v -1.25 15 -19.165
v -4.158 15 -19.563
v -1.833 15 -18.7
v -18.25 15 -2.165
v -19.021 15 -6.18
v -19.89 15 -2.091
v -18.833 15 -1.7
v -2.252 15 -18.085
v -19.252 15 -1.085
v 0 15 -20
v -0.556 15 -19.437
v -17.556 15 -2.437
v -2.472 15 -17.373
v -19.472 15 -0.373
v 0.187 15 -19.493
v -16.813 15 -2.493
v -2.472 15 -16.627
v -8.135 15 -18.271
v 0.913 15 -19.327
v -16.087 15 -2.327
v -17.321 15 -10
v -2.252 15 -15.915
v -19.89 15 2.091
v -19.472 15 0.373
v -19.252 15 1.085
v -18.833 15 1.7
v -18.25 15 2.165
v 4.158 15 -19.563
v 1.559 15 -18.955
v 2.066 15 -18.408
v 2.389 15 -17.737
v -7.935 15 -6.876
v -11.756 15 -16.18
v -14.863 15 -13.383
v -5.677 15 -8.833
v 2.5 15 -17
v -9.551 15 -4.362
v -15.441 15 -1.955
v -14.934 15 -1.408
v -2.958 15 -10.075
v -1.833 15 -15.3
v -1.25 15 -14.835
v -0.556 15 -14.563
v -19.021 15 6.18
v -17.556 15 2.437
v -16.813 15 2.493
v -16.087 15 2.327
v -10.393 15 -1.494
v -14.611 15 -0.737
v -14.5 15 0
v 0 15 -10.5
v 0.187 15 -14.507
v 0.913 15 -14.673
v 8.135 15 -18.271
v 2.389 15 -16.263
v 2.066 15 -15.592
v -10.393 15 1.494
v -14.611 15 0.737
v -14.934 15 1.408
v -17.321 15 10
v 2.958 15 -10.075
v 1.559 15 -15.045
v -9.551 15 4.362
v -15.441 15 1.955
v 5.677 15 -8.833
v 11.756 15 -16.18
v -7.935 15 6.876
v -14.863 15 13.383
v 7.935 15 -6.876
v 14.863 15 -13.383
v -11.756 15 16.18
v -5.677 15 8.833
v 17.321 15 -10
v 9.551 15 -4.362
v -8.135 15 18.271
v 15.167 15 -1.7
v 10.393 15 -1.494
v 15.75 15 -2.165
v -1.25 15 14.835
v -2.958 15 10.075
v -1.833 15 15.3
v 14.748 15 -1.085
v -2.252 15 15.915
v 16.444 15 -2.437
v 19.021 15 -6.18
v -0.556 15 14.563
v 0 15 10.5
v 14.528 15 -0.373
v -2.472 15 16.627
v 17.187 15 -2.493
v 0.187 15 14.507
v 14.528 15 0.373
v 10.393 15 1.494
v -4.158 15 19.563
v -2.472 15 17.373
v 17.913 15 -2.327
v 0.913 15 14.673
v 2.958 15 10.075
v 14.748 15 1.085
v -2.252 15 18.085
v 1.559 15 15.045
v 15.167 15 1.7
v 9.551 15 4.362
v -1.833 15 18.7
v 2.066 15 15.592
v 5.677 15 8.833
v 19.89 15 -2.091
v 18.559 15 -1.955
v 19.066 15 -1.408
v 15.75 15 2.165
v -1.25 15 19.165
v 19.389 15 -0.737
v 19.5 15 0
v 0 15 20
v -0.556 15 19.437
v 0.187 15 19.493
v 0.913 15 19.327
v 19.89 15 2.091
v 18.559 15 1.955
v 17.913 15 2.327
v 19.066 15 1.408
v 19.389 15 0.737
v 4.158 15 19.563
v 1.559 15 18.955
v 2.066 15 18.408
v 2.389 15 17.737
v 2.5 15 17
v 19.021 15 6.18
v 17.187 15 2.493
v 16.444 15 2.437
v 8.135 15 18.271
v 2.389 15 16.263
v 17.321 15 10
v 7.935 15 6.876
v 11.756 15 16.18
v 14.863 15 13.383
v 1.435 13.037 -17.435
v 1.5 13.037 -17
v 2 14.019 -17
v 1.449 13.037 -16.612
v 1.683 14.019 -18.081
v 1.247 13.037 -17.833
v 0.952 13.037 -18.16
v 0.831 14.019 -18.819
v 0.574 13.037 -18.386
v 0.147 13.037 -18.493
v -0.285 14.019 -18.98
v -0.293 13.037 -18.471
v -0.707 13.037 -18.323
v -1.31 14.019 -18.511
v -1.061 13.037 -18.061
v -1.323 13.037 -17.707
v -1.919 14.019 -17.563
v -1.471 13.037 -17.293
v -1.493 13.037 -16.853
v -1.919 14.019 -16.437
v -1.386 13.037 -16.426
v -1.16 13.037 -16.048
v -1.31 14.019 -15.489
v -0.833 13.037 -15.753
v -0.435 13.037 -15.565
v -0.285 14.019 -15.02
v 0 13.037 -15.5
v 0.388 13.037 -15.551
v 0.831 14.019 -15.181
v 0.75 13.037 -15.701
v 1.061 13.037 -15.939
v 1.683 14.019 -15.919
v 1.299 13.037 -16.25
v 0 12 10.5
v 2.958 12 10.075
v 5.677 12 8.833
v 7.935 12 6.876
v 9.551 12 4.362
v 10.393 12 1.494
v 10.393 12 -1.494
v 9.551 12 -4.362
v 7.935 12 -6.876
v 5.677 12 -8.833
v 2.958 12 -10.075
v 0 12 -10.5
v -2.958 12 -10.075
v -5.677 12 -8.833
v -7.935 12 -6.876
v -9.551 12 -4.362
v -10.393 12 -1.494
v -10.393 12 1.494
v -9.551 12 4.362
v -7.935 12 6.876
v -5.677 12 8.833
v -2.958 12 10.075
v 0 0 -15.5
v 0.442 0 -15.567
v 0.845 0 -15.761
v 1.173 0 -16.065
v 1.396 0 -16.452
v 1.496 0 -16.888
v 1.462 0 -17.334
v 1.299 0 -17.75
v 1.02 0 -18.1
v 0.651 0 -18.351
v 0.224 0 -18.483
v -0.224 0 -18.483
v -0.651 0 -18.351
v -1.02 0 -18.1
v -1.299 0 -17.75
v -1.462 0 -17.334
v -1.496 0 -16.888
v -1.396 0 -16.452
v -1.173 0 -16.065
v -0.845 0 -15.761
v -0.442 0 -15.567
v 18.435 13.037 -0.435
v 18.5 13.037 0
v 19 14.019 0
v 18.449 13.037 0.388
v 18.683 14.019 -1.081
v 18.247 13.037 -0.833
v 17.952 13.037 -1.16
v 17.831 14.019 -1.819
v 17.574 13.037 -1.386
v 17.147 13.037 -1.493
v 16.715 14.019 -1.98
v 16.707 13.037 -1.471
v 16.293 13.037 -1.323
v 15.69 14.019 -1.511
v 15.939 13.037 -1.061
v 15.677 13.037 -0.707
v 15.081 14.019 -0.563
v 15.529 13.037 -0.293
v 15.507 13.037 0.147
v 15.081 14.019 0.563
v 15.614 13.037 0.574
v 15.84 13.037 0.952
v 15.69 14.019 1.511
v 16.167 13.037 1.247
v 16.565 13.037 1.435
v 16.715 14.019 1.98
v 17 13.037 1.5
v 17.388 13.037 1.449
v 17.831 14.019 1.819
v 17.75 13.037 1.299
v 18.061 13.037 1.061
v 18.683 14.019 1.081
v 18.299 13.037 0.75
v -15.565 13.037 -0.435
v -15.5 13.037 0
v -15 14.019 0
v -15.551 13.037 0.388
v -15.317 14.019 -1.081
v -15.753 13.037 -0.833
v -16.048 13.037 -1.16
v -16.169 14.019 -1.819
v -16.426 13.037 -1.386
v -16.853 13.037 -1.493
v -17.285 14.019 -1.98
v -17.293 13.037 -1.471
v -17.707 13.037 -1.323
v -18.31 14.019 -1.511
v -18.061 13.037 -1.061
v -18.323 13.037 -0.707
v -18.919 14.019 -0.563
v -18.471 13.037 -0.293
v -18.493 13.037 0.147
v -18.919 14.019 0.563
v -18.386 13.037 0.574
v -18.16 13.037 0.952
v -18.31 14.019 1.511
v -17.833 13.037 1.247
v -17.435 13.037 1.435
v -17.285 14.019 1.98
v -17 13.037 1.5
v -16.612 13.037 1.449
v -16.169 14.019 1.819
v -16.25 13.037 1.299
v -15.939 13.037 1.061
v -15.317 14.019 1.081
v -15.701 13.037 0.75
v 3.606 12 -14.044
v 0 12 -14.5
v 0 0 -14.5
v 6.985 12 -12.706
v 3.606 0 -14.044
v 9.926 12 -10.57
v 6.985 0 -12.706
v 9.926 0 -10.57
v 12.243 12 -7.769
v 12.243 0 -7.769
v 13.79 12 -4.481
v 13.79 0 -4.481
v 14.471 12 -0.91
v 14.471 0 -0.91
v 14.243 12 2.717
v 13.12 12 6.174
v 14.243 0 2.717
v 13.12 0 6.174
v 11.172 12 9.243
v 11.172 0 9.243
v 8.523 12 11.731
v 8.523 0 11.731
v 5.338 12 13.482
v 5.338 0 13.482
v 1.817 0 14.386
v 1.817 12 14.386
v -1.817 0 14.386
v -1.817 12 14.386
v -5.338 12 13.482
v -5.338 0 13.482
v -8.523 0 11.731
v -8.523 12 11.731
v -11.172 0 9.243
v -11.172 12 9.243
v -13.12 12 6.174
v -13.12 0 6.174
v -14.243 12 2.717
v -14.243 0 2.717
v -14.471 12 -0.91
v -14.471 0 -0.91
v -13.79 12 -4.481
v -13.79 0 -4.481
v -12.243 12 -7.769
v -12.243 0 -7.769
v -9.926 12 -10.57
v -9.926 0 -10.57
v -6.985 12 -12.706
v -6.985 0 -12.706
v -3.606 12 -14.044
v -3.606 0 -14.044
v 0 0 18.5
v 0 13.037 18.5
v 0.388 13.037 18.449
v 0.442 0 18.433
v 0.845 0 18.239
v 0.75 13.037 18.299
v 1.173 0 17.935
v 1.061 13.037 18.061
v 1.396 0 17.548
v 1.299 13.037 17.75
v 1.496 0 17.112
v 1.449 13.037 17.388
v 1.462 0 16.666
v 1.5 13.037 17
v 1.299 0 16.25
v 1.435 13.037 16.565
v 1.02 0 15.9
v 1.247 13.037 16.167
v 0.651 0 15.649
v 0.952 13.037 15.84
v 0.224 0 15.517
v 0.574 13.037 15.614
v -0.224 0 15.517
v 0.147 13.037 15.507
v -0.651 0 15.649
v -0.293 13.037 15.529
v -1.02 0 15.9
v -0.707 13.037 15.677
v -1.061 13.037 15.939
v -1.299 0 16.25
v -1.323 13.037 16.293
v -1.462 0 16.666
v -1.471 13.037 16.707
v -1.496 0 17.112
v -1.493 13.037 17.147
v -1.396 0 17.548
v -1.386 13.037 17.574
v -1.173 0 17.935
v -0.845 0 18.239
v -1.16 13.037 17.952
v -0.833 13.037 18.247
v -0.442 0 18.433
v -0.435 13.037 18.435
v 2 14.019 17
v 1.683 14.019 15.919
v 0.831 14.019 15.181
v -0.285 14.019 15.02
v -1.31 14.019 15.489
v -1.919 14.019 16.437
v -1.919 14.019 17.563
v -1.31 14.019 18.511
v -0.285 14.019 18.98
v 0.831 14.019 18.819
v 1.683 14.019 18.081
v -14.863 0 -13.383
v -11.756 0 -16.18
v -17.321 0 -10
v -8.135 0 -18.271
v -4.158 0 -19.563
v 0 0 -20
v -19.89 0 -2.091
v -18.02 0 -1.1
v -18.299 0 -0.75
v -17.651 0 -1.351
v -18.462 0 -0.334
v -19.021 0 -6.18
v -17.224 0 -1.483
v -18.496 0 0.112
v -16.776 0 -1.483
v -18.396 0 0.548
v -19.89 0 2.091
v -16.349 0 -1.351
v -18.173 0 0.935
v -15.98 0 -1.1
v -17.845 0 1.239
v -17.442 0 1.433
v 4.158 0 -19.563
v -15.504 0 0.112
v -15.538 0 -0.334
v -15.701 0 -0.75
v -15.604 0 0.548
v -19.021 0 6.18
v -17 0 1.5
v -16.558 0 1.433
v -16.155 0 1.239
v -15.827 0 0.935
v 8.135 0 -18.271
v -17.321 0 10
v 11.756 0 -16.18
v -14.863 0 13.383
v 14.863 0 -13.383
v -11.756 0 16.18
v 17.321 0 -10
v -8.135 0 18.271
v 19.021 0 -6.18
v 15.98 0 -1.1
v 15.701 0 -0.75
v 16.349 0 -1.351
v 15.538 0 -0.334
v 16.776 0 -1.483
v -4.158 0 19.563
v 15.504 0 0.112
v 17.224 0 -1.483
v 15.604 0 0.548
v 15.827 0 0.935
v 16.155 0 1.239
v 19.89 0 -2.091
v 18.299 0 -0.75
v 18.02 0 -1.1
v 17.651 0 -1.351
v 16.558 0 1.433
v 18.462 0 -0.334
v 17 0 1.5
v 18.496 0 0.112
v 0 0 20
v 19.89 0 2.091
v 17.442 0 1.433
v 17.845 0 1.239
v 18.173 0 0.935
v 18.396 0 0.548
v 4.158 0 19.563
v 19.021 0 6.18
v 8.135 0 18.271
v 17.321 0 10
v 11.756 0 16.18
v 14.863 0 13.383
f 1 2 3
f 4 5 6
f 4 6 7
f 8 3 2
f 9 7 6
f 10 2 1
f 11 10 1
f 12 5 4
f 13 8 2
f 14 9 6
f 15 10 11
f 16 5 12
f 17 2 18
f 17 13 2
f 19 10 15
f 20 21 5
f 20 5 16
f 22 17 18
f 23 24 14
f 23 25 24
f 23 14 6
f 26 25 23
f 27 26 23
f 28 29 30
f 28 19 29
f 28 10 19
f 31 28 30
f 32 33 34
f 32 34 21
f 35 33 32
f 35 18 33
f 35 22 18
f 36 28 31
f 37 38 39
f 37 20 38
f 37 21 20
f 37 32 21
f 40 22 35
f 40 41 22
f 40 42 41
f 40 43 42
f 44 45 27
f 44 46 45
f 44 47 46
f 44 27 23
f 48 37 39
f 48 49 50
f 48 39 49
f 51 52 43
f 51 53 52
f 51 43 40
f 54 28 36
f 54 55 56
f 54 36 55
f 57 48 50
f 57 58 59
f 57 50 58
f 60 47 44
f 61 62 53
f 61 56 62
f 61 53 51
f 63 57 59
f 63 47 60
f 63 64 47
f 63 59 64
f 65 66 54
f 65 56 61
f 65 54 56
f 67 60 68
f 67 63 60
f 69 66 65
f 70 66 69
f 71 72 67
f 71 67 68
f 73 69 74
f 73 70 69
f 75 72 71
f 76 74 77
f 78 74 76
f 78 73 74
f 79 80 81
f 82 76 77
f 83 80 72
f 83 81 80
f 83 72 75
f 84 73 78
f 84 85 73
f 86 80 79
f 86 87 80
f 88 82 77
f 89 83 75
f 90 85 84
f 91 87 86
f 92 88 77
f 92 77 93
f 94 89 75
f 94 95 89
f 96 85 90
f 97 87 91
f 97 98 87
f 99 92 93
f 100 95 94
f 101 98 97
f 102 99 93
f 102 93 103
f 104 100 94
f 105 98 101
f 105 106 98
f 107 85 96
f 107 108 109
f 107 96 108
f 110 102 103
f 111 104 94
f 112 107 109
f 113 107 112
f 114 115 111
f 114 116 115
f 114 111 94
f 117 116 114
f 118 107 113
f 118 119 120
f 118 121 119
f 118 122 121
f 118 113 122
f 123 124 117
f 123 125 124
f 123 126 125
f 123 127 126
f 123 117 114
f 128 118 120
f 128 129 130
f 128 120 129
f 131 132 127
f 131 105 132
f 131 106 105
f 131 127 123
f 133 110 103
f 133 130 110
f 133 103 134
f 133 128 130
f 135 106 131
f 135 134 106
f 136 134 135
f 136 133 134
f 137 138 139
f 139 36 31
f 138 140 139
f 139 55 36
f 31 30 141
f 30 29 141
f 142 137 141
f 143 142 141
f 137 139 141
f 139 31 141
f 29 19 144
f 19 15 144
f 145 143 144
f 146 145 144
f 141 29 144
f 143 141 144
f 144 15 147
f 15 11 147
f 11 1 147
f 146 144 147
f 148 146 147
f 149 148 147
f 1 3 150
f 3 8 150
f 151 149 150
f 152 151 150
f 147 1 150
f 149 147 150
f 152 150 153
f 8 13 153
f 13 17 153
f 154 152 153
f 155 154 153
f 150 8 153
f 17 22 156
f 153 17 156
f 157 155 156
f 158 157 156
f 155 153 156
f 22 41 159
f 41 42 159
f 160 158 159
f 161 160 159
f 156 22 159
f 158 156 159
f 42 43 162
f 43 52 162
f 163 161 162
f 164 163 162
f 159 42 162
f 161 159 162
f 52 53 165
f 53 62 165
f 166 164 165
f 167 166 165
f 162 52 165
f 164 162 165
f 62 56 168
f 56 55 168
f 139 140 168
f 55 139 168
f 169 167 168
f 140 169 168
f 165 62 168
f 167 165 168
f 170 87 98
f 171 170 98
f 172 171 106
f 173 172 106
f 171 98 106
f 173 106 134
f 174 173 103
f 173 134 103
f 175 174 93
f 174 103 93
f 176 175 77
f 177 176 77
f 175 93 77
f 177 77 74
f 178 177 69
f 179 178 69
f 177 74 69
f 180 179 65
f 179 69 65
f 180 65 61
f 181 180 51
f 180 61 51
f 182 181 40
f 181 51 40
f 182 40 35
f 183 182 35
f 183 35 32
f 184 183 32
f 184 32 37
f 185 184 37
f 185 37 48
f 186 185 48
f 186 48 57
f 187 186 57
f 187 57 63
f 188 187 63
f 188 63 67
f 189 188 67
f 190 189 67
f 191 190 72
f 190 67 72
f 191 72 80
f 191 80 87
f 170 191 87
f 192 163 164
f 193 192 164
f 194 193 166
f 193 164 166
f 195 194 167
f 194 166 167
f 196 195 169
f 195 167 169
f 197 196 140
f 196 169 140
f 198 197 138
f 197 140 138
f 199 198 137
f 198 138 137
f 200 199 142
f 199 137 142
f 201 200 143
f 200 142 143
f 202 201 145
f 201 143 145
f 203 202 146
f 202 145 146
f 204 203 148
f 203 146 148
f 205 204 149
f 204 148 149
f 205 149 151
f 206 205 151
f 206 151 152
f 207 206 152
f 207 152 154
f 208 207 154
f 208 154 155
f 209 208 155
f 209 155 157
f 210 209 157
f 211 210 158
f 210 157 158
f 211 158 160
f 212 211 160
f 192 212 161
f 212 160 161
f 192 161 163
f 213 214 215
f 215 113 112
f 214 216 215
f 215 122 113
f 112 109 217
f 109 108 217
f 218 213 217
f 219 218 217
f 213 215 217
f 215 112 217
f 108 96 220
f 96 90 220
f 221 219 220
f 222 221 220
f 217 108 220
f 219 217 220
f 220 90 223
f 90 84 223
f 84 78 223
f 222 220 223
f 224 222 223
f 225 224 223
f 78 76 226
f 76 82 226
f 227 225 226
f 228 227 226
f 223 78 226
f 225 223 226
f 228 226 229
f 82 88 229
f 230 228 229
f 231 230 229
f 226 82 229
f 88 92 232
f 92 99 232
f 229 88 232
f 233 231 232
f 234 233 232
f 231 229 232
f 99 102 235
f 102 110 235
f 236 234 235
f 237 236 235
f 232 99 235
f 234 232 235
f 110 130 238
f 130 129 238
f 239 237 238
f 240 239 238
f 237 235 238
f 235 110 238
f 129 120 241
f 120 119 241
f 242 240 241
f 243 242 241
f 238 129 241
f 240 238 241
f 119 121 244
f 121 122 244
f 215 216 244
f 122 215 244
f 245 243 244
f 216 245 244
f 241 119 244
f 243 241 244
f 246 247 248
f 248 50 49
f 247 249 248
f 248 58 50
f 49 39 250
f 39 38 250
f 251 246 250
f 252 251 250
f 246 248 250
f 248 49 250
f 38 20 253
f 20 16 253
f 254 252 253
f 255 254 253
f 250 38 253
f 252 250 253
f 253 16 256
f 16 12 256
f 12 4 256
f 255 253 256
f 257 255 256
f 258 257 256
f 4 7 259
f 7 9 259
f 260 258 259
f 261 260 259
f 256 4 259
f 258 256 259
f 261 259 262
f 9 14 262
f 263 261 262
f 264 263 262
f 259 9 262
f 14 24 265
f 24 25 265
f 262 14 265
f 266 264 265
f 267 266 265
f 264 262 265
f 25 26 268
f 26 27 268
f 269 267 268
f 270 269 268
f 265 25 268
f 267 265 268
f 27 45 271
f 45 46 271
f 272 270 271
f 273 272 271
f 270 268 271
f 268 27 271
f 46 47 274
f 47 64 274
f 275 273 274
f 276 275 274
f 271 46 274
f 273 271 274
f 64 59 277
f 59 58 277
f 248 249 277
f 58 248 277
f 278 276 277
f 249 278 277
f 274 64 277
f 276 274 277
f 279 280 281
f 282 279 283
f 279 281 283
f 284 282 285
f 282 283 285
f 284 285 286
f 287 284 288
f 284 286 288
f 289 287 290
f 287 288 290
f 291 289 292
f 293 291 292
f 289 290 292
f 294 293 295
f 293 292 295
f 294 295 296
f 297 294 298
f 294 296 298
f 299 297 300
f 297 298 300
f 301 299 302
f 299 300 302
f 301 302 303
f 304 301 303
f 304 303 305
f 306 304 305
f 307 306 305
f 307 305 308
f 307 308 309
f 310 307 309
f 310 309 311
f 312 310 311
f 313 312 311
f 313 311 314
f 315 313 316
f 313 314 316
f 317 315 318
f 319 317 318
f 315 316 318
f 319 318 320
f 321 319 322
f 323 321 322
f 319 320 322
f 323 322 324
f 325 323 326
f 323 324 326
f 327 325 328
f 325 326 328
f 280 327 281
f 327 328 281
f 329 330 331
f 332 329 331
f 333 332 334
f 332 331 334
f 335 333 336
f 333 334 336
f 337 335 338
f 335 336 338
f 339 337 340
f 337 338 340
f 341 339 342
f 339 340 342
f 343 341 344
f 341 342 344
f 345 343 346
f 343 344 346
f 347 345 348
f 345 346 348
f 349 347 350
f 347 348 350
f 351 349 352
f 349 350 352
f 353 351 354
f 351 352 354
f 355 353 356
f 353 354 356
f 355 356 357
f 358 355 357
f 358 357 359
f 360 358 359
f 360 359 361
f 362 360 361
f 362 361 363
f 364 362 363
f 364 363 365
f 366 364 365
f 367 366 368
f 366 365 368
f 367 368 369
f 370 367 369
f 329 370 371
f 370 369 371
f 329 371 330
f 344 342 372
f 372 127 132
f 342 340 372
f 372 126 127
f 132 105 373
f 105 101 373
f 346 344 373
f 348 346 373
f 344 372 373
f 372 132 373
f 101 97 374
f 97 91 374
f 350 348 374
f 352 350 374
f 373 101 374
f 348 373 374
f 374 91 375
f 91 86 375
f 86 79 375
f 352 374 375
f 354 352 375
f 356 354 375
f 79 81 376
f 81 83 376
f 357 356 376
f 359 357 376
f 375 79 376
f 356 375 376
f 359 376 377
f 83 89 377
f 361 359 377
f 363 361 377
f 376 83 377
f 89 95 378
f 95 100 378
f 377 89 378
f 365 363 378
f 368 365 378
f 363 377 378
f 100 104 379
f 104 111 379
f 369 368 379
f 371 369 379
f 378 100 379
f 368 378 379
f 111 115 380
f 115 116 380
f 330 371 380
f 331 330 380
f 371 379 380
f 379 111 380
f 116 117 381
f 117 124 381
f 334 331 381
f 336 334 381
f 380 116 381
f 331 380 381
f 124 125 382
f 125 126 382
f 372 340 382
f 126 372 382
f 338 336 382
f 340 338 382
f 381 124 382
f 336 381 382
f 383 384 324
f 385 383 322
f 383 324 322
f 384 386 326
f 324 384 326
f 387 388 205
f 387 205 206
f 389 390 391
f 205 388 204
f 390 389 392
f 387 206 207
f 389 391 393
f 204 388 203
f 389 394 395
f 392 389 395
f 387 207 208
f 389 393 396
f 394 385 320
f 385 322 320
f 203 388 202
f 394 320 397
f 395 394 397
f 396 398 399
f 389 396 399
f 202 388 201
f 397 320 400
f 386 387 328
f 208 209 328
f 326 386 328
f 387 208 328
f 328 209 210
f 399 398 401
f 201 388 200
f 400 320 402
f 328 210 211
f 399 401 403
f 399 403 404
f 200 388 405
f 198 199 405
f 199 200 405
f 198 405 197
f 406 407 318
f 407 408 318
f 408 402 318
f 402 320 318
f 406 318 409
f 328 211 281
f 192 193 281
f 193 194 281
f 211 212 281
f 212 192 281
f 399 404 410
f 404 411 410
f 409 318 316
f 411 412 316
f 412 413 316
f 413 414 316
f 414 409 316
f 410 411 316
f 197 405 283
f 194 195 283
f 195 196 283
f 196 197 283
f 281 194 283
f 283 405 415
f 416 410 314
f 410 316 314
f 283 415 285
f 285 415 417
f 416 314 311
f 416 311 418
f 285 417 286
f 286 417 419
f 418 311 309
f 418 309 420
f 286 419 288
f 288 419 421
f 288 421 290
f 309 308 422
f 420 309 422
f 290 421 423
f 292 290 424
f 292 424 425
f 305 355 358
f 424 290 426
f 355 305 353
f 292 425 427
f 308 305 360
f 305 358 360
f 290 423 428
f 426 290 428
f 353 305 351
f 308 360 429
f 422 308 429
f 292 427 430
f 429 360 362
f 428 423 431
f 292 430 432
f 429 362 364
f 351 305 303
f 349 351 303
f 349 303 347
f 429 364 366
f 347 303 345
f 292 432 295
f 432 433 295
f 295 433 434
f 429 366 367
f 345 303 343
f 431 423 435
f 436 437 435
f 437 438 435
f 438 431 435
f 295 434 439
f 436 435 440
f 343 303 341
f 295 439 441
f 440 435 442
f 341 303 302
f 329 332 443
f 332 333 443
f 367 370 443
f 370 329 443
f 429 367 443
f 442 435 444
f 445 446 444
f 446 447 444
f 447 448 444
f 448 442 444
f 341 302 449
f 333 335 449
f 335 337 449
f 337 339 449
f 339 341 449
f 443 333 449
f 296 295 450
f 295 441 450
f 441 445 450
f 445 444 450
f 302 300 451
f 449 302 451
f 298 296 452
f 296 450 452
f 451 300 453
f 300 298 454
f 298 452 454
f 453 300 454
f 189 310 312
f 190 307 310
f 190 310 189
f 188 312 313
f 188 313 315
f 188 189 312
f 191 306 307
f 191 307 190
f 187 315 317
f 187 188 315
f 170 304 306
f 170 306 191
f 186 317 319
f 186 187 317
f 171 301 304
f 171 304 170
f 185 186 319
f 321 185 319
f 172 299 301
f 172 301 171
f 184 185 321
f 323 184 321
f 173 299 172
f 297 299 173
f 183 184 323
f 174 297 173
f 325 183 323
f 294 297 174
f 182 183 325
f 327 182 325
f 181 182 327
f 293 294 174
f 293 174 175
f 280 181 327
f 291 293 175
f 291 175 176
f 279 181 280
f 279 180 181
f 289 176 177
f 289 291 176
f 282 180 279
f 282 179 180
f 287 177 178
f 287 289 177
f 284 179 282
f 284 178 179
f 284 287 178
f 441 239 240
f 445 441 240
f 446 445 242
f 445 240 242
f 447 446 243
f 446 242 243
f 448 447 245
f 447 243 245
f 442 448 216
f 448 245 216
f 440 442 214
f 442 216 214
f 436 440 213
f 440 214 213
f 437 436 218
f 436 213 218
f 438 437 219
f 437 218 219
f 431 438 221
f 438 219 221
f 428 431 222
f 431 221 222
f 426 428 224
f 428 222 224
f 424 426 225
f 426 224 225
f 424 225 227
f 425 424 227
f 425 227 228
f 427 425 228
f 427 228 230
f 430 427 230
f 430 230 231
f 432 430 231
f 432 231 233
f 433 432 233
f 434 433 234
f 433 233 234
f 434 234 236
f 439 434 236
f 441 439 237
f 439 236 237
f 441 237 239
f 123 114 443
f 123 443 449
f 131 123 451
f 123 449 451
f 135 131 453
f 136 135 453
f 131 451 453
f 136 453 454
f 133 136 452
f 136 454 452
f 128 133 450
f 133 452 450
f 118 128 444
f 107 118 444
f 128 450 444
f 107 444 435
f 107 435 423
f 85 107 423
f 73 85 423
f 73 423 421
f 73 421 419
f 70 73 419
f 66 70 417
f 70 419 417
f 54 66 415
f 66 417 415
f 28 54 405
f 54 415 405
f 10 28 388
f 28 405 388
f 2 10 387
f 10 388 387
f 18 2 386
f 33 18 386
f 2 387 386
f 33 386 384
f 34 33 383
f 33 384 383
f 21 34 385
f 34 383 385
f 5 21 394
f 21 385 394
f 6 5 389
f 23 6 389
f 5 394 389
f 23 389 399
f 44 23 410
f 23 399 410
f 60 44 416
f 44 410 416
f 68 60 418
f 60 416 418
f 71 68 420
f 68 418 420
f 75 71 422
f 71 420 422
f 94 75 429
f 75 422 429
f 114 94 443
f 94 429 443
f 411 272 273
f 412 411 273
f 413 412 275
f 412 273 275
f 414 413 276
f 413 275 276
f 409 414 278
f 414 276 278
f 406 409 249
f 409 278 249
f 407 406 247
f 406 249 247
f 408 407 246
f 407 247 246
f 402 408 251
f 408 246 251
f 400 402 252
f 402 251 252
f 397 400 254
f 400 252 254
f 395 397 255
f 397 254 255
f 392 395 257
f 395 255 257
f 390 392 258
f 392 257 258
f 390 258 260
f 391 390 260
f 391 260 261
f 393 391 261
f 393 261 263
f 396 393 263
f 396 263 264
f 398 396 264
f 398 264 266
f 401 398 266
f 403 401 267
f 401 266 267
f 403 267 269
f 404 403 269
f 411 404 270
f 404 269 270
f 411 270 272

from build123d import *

# Parameters (mm, degrees)
SKETCH1_R                    = 20
BOSS_EXTRUDE1_DEPTH          = 15
SKETCH4_R                    = 14.5
CUT_EXTRUDE3_DEPTH           = 12
SKETCH5_R                    = 10.5
CUT_EXTRUDE4_DEPTH           = 12
SKETCH6_R                    = 1.5
CUT_EXTRUDE5_DEPTH           = 33.015621187
SKETCH7_R                    = 2.5
CUT_EXTRUDE7_DEPTH           = 2
CUT_EXTRUDE7_DRAFT           = -27
CUT_EXTRUDE7_PROFILE_2_DEPTH = 2
CUT_EXTRUDE7_PROFILE_2_DRAFT = -27
CUT_EXTRUDE7_PROFILE_3_DEPTH = 2
CUT_EXTRUDE7_PROFILE_3_DRAFT = -27
CUT_EXTRUDE7_PROFILE_4_DEPTH = 2
CUT_EXTRUDE7_PROFILE_4_DRAFT = -27


with BuildPart() as part:
    # Sketch1 → Boss-Extrude1 (new body)
    with BuildSketch(Plane(origin=(0, 0, 0), x_dir=(1, 0, 0), z_dir=(0, 1, 0))):
        with Locations(Location((0, 0, 0), (0, 0, 270))):
            Circle(SKETCH1_R)
    extrude(amount=BOSS_EXTRUDE1_DEPTH)

    # Sketch4 → Cut-Extrude3 (cut)
    with BuildSketch(Plane.XZ):
        with Locations(Location((0, 0, 0), (0, 0, 270))):
            Circle(SKETCH4_R)
    extrude(amount=-CUT_EXTRUDE3_DEPTH, mode=Mode.SUBTRACT)

    # Sketch5 → Cut-Extrude4 (cut)
    with BuildSketch(Plane(origin=(0, 15, 0), x_dir=(1, 0, 0), z_dir=(0, 1, 0))):
        with Locations(Location((0, 0, 0), (0, 0, 270))):
            Circle(SKETCH5_R)
    extrude(amount=-CUT_EXTRUDE4_DEPTH, mode=Mode.SUBTRACT)

    # Sketch6 → Cut-Extrude5 (cut, through all)
    with BuildSketch(Plane(origin=(0, 15, 0), x_dir=(1, 0, 0), z_dir=(0, 1, 0))):
        with Locations(Location((0, 17, 0), (0, 0, 270))):
            Circle(SKETCH6_R)
        with Locations(Location((17, 0, 0), (0, 0, 270))):
            Circle(SKETCH6_R)
        with Locations(Location((0, -17, 0), (0, 0, 270))):
            Circle(SKETCH6_R)
        with Locations(Location((-17, 0, 0), (0, 0, 270))):
            Circle(SKETCH6_R)
    extrude(amount=-CUT_EXTRUDE5_DEPTH, mode=Mode.SUBTRACT)


with BuildPart() as cut_extrude7_tool:
    # Sketch7 → Cut-Extrude7 (with draft: the straight prism first)
    with BuildSketch(Plane(origin=(0, 15, 0), x_dir=(1, 0, 0), z_dir=(0, 1, 0))):
        with Locations((0, 17)):
            Circle(SKETCH7_R)
    extrude(amount=-CUT_EXTRUDE7_DEPTH)
    # Cut-Extrude7: the draft: its side faces are tilted about the plane it starts from
    cut_extrude7_sides = [cut_extrude7_tool.faces().sort_by_distance(p)[0] for p in [
        (-2.5, 14, -17),
    ]]
    draft(cut_extrude7_sides, Plane(origin=(0, 15, 0), x_dir=(1, 0, 0), z_dir=(0, 1, 0)), CUT_EXTRUDE7_DRAFT)


with BuildPart() as part_1:
    add(part.part)

    # Cut-Extrude7: cut by cut_extrude7_tool
    add(cut_extrude7_tool.part, mode=Mode.SUBTRACT)


with BuildPart() as cut_extrude7_profile_2_tool:
    # Sketch7 → Cut-Extrude7 profile 2 (with draft: the straight prism first)
    with BuildSketch(Plane(origin=(0, 15, 0), x_dir=(1, 0, 0), z_dir=(0, 1, 0))):
        with Locations((17, 0)):
            Circle(SKETCH7_R)
    extrude(amount=-CUT_EXTRUDE7_PROFILE_2_DEPTH)
    # Cut-Extrude7 profile 2: the draft: its side faces are tilted about the plane it starts from
    cut_extrude7_profile_2_sides = [cut_extrude7_profile_2_tool.faces().sort_by_distance(p)[0] for p in [
        (14.5, 14, 0),
    ]]
    draft(cut_extrude7_profile_2_sides, Plane(origin=(0, 15, 0), x_dir=(1, 0, 0), z_dir=(0, 1, 0)), CUT_EXTRUDE7_PROFILE_2_DRAFT)


with BuildPart() as part_2:
    add(part_1.part)

    # Cut-Extrude7 profile 2: cut by cut_extrude7_profile_2_tool
    add(cut_extrude7_profile_2_tool.part, mode=Mode.SUBTRACT)


with BuildPart() as cut_extrude7_profile_3_tool:
    # Sketch7 → Cut-Extrude7 profile 3 (with draft: the straight prism first)
    with BuildSketch(Plane(origin=(0, 15, 0), x_dir=(1, 0, 0), z_dir=(0, 1, 0))):
        with Locations((0, -17)):
            Circle(SKETCH7_R)
    extrude(amount=-CUT_EXTRUDE7_PROFILE_3_DEPTH)
    # Cut-Extrude7 profile 3: the draft: its side faces are tilted about the plane it starts from
    cut_extrude7_profile_3_sides = [cut_extrude7_profile_3_tool.faces().sort_by_distance(p)[0] for p in [
        (-2.5, 14, 17),
    ]]
    draft(cut_extrude7_profile_3_sides, Plane(origin=(0, 15, 0), x_dir=(1, 0, 0), z_dir=(0, 1, 0)), CUT_EXTRUDE7_PROFILE_3_DRAFT)


with BuildPart() as part_3:
    add(part_2.part)

    # Cut-Extrude7 profile 3: cut by cut_extrude7_profile_3_tool
    add(cut_extrude7_profile_3_tool.part, mode=Mode.SUBTRACT)


with BuildPart() as cut_extrude7_profile_4_tool:
    # Sketch7 → Cut-Extrude7 profile 4 (with draft: the straight prism first)
    with BuildSketch(Plane(origin=(0, 15, 0), x_dir=(1, 0, 0), z_dir=(0, 1, 0))):
        with Locations((-17, 0)):
            Circle(SKETCH7_R)
    extrude(amount=-CUT_EXTRUDE7_PROFILE_4_DEPTH)
    # Cut-Extrude7 profile 4: the draft: its side faces are tilted about the plane it starts from
    cut_extrude7_profile_4_sides = [cut_extrude7_profile_4_tool.faces().sort_by_distance(p)[0] for p in [
        (-19.5, 14, 0),
    ]]
    draft(cut_extrude7_profile_4_sides, Plane(origin=(0, 15, 0), x_dir=(1, 0, 0), z_dir=(0, 1, 0)), CUT_EXTRUDE7_PROFILE_4_DRAFT)


with BuildPart() as part_4:
    add(part_3.part)

    # Cut-Extrude7 profile 4: cut by cut_extrude7_profile_4_tool
    add(cut_extrude7_profile_4_tool.part, mode=Mode.SUBTRACT)


solid = part_4.part
